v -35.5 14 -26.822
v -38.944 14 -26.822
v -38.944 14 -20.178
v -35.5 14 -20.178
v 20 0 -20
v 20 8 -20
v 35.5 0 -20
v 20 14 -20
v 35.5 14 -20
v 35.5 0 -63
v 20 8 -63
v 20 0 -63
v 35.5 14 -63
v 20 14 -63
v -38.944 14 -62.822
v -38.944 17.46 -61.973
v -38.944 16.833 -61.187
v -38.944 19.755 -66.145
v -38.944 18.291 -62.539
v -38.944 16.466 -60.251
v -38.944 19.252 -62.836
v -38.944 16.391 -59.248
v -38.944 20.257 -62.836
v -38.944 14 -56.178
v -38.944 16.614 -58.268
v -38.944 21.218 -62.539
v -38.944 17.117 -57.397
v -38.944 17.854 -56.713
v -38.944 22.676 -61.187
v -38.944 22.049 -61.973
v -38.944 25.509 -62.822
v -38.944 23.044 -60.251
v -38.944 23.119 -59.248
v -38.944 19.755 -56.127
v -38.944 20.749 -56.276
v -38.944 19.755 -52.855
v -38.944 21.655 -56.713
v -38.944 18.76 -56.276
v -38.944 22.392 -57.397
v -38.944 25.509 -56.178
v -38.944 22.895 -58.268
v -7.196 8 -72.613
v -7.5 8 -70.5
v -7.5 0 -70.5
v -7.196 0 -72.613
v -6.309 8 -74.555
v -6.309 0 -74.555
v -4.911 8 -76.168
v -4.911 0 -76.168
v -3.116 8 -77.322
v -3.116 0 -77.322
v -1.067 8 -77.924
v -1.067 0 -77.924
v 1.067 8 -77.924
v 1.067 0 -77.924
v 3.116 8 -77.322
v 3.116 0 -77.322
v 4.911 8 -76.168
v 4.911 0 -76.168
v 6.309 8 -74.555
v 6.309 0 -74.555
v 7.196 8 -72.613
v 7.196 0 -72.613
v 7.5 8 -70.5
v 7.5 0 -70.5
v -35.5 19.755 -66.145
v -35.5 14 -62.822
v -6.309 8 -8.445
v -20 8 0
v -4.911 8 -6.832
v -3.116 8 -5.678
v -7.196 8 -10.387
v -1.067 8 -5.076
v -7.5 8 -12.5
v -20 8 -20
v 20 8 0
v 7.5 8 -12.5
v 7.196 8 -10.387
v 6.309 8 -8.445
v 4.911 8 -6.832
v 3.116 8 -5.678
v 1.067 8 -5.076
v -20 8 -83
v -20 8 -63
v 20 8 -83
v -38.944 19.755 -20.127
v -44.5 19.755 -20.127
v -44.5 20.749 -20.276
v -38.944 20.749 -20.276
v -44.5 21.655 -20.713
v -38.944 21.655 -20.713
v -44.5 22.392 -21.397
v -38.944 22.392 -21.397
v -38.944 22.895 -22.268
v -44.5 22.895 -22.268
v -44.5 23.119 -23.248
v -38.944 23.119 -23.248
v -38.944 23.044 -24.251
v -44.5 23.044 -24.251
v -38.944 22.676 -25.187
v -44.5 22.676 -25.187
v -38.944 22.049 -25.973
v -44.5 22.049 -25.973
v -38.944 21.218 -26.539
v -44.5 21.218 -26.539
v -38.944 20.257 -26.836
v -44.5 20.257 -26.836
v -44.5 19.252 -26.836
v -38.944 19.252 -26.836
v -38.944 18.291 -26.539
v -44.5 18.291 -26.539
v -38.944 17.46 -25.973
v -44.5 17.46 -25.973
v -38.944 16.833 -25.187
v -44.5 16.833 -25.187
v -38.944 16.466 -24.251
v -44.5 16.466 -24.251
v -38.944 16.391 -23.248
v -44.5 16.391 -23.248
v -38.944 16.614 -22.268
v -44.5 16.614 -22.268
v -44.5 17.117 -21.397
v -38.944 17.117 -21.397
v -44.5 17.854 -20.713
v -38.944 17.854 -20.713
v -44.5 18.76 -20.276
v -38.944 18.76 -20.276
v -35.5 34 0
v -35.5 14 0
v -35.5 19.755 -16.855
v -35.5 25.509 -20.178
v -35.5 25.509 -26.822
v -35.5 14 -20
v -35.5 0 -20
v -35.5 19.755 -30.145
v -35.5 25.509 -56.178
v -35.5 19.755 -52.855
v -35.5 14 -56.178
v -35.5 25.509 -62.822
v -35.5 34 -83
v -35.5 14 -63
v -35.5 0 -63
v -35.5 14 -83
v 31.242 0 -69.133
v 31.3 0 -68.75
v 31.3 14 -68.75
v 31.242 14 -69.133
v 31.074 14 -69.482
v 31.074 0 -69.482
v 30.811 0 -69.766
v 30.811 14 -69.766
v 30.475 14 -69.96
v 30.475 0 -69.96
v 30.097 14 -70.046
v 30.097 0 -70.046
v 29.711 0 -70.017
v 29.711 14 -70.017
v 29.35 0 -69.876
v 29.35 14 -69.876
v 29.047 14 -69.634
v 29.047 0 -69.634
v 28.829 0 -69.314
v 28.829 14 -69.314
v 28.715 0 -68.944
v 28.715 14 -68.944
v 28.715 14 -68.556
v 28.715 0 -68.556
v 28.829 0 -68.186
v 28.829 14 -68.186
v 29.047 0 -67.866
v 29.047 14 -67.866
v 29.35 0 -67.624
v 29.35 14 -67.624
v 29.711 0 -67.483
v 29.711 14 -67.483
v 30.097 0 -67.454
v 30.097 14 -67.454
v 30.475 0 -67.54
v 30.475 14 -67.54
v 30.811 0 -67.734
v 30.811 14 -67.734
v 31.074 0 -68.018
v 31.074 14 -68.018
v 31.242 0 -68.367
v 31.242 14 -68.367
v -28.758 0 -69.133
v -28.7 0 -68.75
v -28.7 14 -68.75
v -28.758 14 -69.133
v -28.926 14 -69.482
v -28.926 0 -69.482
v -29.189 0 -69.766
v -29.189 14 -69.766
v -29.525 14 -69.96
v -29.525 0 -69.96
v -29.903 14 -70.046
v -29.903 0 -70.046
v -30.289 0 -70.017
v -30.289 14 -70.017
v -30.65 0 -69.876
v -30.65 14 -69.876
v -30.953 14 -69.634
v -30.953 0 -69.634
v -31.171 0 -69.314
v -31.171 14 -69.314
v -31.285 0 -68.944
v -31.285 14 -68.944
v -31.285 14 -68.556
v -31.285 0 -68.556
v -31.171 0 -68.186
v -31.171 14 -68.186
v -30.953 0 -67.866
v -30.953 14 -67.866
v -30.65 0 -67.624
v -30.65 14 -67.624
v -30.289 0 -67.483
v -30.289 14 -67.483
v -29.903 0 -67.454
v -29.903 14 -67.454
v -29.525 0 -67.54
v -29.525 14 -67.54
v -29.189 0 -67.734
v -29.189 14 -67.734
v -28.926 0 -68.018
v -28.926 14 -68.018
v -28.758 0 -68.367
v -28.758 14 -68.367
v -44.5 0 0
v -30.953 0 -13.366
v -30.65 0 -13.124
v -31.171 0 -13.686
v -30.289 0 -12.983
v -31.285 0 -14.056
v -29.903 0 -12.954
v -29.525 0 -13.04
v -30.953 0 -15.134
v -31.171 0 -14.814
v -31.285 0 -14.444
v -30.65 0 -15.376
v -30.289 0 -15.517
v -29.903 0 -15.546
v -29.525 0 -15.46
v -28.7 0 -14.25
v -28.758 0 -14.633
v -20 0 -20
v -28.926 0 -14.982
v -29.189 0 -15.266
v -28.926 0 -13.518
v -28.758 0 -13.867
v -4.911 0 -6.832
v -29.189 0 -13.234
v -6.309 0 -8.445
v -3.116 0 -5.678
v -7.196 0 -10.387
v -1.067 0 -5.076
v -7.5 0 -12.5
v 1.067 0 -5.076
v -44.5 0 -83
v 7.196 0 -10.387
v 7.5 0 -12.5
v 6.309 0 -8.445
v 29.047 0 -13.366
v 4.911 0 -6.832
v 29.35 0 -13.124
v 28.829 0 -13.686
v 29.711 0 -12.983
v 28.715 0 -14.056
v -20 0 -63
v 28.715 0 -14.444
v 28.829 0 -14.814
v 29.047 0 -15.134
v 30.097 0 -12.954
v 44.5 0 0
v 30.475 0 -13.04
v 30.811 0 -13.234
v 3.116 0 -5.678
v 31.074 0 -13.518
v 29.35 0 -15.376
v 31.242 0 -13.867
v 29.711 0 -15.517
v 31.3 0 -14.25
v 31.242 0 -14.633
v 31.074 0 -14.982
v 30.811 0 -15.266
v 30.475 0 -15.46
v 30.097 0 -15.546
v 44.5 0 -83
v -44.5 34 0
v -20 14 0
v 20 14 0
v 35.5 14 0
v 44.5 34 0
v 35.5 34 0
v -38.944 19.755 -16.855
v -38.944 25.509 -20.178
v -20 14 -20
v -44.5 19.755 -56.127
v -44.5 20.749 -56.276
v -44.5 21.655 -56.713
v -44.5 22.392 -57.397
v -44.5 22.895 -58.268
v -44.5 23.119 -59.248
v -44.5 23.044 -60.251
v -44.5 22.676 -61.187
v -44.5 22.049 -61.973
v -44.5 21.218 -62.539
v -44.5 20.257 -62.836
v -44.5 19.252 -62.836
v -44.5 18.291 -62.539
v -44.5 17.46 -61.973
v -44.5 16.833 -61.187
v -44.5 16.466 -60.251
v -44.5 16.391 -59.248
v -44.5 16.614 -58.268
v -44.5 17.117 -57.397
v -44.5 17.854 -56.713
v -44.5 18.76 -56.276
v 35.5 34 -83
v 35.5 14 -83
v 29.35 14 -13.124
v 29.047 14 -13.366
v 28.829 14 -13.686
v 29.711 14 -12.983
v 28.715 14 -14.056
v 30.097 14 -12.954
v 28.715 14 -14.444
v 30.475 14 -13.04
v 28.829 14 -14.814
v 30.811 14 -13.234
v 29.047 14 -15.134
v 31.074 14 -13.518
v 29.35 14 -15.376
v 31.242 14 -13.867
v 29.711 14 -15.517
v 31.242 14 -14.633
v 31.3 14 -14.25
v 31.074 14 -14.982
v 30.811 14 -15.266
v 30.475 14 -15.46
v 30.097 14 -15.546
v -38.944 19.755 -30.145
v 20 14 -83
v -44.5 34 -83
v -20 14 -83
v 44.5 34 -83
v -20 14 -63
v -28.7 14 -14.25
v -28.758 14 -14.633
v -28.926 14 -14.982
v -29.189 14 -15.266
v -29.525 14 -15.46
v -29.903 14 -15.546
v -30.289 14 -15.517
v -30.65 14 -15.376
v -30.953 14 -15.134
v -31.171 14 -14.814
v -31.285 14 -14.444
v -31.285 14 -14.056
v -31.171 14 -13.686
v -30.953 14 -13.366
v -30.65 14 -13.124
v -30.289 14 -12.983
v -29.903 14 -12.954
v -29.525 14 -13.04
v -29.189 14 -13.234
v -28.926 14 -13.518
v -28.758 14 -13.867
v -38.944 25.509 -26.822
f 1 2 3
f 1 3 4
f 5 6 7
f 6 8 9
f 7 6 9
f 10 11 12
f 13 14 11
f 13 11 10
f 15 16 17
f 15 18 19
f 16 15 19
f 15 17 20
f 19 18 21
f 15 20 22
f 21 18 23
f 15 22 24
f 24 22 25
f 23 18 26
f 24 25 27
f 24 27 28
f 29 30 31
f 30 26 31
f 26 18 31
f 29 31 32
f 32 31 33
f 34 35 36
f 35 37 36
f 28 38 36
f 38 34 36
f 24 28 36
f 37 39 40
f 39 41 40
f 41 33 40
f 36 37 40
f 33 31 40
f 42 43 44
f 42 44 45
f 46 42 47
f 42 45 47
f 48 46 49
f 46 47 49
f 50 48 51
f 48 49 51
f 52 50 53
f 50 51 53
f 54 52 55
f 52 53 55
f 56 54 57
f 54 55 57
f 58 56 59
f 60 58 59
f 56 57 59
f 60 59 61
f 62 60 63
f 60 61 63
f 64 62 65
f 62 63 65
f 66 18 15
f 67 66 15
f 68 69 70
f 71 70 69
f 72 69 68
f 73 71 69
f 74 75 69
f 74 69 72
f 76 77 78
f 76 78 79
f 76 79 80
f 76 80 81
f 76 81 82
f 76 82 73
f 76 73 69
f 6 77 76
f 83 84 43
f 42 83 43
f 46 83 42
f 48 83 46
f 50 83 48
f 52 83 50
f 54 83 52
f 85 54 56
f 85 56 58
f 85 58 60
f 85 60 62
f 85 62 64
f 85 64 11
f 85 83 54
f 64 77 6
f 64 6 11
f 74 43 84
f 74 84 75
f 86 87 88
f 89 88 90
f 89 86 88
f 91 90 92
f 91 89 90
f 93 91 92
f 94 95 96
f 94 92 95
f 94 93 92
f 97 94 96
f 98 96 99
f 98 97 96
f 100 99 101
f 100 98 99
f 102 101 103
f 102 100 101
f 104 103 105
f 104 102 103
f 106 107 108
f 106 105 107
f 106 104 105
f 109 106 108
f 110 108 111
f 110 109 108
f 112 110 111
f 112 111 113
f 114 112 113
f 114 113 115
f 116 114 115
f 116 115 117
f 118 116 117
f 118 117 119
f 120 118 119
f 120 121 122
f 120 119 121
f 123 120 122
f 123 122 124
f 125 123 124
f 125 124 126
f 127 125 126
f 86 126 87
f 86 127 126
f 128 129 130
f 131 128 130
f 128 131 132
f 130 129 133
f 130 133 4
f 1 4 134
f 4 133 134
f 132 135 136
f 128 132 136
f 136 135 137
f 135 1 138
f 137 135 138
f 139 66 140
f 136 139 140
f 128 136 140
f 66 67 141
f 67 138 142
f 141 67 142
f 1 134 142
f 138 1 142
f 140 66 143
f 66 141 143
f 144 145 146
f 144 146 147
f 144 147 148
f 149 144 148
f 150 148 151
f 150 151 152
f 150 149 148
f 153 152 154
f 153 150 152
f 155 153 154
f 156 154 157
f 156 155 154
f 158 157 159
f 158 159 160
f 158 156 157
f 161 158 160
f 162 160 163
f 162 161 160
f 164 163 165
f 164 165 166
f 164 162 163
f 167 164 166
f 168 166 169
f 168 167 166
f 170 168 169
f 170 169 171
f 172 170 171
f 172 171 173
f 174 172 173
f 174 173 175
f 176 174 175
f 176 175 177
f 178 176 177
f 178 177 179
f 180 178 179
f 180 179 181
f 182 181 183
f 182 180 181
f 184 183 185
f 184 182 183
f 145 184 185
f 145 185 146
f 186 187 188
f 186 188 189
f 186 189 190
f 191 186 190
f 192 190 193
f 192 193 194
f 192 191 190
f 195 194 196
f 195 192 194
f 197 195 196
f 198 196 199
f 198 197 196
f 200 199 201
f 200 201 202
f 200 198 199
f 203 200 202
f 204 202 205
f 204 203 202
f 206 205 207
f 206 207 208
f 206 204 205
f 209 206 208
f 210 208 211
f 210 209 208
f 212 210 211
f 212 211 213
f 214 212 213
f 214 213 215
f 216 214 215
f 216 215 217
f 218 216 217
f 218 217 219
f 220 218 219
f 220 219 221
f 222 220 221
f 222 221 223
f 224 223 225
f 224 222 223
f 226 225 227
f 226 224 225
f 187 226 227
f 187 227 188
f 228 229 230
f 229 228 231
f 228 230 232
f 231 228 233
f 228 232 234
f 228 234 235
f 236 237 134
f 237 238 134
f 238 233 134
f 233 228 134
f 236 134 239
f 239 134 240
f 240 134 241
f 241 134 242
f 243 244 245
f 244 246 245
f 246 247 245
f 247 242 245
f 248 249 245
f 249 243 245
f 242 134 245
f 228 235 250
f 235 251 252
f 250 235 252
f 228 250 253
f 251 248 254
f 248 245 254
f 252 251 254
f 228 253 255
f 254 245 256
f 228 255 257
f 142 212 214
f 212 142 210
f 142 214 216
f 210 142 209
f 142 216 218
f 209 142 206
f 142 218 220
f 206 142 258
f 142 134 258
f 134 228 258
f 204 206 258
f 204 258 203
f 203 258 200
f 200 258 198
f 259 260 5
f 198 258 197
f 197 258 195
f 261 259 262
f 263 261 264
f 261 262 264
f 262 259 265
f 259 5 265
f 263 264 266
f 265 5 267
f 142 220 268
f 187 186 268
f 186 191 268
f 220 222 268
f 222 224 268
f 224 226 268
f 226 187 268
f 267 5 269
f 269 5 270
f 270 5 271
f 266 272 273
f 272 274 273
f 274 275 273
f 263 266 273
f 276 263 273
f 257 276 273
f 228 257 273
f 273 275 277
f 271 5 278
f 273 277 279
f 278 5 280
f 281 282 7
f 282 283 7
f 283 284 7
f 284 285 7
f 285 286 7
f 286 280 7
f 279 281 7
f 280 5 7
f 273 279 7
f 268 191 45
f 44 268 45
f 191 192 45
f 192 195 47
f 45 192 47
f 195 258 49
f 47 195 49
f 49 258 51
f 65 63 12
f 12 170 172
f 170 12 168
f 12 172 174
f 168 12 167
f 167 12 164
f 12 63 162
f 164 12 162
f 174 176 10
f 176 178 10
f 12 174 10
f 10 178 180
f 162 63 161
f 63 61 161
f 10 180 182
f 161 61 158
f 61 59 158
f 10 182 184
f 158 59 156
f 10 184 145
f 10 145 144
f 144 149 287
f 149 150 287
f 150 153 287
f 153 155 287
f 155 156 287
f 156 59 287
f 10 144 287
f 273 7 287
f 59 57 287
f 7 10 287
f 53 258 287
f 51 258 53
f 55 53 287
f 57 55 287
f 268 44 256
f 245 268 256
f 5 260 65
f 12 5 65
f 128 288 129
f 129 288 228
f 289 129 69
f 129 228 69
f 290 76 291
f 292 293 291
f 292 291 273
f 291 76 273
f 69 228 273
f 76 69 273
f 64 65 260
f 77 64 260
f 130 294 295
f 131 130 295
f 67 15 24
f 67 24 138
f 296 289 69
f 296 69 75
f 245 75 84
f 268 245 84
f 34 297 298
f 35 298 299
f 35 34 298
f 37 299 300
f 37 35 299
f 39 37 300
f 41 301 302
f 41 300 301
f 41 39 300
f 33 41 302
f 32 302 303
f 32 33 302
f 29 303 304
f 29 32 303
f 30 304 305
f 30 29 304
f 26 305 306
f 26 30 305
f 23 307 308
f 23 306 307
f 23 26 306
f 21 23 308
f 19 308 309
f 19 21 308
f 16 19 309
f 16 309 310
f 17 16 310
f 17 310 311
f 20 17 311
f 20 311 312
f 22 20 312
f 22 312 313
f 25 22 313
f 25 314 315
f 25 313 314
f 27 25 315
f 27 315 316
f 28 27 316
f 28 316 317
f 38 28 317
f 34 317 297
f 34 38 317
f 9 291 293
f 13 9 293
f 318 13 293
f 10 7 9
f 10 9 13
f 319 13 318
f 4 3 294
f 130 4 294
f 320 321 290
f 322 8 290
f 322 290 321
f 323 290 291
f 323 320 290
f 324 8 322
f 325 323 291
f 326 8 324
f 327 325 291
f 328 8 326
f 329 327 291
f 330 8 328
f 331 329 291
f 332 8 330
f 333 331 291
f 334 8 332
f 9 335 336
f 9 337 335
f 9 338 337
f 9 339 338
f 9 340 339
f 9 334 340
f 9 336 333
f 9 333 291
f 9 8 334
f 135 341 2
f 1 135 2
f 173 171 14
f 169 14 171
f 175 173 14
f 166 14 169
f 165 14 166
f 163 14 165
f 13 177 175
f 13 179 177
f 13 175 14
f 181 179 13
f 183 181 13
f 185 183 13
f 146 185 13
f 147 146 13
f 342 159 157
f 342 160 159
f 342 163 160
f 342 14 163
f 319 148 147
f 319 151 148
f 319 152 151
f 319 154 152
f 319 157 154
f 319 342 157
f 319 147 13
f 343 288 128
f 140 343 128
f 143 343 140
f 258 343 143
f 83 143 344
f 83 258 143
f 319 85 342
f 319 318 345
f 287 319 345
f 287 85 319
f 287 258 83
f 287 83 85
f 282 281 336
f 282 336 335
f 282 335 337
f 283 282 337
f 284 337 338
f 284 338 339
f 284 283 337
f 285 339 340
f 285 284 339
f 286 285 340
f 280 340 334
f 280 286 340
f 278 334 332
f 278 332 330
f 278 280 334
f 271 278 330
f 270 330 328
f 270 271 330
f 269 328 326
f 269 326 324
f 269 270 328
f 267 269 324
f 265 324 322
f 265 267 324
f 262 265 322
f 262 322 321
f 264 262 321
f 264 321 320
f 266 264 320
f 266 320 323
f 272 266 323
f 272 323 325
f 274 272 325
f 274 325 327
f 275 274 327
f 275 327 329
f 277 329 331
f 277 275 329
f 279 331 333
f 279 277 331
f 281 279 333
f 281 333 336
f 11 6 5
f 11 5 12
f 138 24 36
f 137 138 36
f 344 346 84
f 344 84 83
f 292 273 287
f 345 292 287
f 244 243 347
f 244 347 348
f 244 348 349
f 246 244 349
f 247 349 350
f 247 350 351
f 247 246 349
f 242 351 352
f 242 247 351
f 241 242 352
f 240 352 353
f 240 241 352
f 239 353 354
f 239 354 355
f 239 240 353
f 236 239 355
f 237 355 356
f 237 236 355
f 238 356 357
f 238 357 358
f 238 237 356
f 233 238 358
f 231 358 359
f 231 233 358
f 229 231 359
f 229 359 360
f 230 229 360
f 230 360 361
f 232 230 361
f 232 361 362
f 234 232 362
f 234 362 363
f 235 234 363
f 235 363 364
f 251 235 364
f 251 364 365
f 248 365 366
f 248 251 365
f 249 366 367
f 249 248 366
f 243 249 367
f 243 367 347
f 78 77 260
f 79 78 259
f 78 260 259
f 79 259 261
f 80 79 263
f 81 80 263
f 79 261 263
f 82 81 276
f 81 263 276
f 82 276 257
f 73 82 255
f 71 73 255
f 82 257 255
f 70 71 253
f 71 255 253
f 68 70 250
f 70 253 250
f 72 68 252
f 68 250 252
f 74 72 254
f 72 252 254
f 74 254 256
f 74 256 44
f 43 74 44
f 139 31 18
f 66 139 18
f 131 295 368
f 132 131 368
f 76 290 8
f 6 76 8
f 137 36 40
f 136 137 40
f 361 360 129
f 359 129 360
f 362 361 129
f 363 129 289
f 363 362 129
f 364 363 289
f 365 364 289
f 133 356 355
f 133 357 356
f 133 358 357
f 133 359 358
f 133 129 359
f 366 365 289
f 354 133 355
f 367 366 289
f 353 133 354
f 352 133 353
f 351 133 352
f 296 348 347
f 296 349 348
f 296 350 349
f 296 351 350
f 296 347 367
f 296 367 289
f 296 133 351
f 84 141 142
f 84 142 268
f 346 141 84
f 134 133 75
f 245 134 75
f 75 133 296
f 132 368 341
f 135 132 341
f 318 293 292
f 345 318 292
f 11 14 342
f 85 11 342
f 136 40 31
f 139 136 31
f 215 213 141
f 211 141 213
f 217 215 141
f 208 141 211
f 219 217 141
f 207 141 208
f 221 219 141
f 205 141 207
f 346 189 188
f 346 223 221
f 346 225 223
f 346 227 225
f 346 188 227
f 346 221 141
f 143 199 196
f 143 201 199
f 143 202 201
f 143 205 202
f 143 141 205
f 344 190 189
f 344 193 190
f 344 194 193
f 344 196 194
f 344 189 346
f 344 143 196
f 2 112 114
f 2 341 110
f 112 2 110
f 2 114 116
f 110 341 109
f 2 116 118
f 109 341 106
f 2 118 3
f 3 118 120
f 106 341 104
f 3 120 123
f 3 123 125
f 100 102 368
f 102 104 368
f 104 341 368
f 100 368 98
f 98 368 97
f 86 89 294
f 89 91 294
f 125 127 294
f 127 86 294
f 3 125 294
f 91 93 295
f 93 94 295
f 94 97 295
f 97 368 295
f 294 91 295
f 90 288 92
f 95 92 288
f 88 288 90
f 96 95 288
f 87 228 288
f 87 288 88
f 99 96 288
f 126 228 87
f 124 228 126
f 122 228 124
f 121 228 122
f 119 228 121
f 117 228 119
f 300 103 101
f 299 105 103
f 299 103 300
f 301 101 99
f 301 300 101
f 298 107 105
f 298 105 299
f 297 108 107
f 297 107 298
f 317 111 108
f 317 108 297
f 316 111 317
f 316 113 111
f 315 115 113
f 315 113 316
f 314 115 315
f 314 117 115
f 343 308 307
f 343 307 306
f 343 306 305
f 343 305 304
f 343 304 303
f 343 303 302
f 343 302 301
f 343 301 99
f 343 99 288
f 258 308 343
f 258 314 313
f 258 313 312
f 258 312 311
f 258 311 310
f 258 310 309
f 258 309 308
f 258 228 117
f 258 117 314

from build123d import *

# Parameters (mm, degrees)
SKETCH1_W                = 89
SKETCH1_H                = 83
SKETCH1_R                = 1.3
MAIN_BODY_DEPTH          = 14
SKETCH2_W                = 40
SKETCH2_H                = 83
SCREW_GROOVE_DEPTH       = 6
SKETCH4_W                = 9
SKETCH4_H                = 83
MOUNT_LIFT_DEPTH         = 20
MOUNT_START              = -5.55625
MOUNT_NUTS_DEPTH         = 18.94375
F_9_32_MOUNT_HOLES_REACH = 7.556
SKETCH5_R                = 3.3734375
SKETCH8_W                = 15.5
SKETCH8_H                = 43
MIDDLE_CUT_DEPTH         = 14


with BuildPart() as part:
    # Sketch1 → Main Body (new body)
    with BuildSketch(Plane(origin=(0, 0, 0), x_dir=(1, 0, 0), z_dir=(0, 1, 0))):
        with Locations((0, 41.5)):
            Rectangle(SKETCH1_W, SKETCH1_H)
        with Locations((-30, 14.25)):
            Circle(SKETCH1_R, mode=Mode.SUBTRACT)
        with Locations((30, 14.25)):
            Circle(SKETCH1_R, mode=Mode.SUBTRACT)
        with BuildLine():
            Line((-7.5, 12.5), (-7.5, 70.5))
            ThreePointArc((-7.5, 70.5), (0, 78), (7.5, 70.5))
            Line((7.5, 70.5), (7.5, 12.5))
            ThreePointArc((7.5, 12.5), (0, 5), (-7.5, 12.5))
        make_face(mode=Mode.SUBTRACT)
        with Locations((-30, 68.75)):
            Circle(SKETCH1_R, mode=Mode.SUBTRACT)
        with Locations((30, 68.75)):
            Circle(SKETCH1_R, mode=Mode.SUBTRACT)
    extrude(amount=MAIN_BODY_DEPTH)

    # Sketch2 → Screw Groove (cut)
    with BuildSketch(Plane(origin=(0, 14, 0), x_dir=(1, 0, 0), z_dir=(0, 1, 0))):
        with Locations((0, 41.5)):
            Rectangle(SKETCH2_W, SKETCH2_H)
    extrude(amount=-SCREW_GROOVE_DEPTH, mode=Mode.SUBTRACT)

    # Sketch4 → Mount Lift (add)
    with BuildSketch(Plane(origin=(0, 14, 0), x_dir=(1, 0, 0), z_dir=(0, 1, 0))):
        with Locations((-40, 41.5)):
            Rectangle(SKETCH4_W, SKETCH4_H)
        with Locations((40, 41.5)):
            Rectangle(SKETCH4_W, SKETCH4_H)
    extrude(amount=MOUNT_LIFT_DEPTH)

    # Sketch6 → Mount Nuts (cut)
    with BuildSketch(Plane.ZY.offset(44.5).offset(MOUNT_START)):
        Polygon((-52.855059246, 19.7546875), (-56.177529623, 25.509375), (-62.822470377, 25.509375), (-66.144940754, 19.7546875), (-62.822470377, 14), (-56.177529623, 14), align=None)
        Polygon((-16.855059246, 19.7546875), (-20.177529623, 25.509375), (-26.822470377, 25.509375), (-30.144940754, 19.7546875), (-26.822470377, 14), (-20.177529623, 14), align=None)
    extrude(amount=-MOUNT_NUTS_DEPTH, mode=Mode.SUBTRACT)

    # Sketch5 → 9/32 Mount Holes (cut, up to next)
    with BuildSketch(Plane.ZY.offset(38.94375), mode=Mode.PRIVATE) as f_9_32_mount_holes_sk1:
        with Locations((-59.5, 19.7546875)):
            Circle(SKETCH5_R)
    f_9_32_mount_holes_tool1 = extrude(f_9_32_mount_holes_sk1.sketch, amount=F_9_32_MOUNT_HOLES_REACH, mode=Mode.PRIVATE) & part.part
    add(f_9_32_mount_holes_tool1.solids().sort_by_distance((-38.94375, 19.754688, -59.5))[0], mode=Mode.SUBTRACT)
    # Sketch5 → 9/32 Mount Holes (cut, up to next)
    with BuildSketch(Plane.ZY.offset(38.94375), mode=Mode.PRIVATE) as f_9_32_mount_holes_sk2:
        with Locations((-23.5, 19.7546875)):
            Circle(SKETCH5_R)
    f_9_32_mount_holes_tool2 = extrude(f_9_32_mount_holes_sk2.sketch, amount=F_9_32_MOUNT_HOLES_REACH, mode=Mode.PRIVATE) & part.part
    add(f_9_32_mount_holes_tool2.solids().sort_by_distance((-38.94375, 19.754688, -23.5))[0], mode=Mode.SUBTRACT)

    # Sketch8 → Middle Cut (cut)
    with BuildSketch(Plane(origin=(0, 14, 0), x_dir=(1, 0, 0), z_dir=(0, 1, 0))):
        with Locations((-27.75, 41.5)):
            Rectangle(SKETCH8_W, SKETCH8_H)
        with Locations((27.75, 41.5)):
            Rectangle(SKETCH8_W, SKETCH8_H)
    extrude(amount=-MIDDLE_CUT_DEPTH, mode=Mode.SUBTRACT)


solid = part.part
